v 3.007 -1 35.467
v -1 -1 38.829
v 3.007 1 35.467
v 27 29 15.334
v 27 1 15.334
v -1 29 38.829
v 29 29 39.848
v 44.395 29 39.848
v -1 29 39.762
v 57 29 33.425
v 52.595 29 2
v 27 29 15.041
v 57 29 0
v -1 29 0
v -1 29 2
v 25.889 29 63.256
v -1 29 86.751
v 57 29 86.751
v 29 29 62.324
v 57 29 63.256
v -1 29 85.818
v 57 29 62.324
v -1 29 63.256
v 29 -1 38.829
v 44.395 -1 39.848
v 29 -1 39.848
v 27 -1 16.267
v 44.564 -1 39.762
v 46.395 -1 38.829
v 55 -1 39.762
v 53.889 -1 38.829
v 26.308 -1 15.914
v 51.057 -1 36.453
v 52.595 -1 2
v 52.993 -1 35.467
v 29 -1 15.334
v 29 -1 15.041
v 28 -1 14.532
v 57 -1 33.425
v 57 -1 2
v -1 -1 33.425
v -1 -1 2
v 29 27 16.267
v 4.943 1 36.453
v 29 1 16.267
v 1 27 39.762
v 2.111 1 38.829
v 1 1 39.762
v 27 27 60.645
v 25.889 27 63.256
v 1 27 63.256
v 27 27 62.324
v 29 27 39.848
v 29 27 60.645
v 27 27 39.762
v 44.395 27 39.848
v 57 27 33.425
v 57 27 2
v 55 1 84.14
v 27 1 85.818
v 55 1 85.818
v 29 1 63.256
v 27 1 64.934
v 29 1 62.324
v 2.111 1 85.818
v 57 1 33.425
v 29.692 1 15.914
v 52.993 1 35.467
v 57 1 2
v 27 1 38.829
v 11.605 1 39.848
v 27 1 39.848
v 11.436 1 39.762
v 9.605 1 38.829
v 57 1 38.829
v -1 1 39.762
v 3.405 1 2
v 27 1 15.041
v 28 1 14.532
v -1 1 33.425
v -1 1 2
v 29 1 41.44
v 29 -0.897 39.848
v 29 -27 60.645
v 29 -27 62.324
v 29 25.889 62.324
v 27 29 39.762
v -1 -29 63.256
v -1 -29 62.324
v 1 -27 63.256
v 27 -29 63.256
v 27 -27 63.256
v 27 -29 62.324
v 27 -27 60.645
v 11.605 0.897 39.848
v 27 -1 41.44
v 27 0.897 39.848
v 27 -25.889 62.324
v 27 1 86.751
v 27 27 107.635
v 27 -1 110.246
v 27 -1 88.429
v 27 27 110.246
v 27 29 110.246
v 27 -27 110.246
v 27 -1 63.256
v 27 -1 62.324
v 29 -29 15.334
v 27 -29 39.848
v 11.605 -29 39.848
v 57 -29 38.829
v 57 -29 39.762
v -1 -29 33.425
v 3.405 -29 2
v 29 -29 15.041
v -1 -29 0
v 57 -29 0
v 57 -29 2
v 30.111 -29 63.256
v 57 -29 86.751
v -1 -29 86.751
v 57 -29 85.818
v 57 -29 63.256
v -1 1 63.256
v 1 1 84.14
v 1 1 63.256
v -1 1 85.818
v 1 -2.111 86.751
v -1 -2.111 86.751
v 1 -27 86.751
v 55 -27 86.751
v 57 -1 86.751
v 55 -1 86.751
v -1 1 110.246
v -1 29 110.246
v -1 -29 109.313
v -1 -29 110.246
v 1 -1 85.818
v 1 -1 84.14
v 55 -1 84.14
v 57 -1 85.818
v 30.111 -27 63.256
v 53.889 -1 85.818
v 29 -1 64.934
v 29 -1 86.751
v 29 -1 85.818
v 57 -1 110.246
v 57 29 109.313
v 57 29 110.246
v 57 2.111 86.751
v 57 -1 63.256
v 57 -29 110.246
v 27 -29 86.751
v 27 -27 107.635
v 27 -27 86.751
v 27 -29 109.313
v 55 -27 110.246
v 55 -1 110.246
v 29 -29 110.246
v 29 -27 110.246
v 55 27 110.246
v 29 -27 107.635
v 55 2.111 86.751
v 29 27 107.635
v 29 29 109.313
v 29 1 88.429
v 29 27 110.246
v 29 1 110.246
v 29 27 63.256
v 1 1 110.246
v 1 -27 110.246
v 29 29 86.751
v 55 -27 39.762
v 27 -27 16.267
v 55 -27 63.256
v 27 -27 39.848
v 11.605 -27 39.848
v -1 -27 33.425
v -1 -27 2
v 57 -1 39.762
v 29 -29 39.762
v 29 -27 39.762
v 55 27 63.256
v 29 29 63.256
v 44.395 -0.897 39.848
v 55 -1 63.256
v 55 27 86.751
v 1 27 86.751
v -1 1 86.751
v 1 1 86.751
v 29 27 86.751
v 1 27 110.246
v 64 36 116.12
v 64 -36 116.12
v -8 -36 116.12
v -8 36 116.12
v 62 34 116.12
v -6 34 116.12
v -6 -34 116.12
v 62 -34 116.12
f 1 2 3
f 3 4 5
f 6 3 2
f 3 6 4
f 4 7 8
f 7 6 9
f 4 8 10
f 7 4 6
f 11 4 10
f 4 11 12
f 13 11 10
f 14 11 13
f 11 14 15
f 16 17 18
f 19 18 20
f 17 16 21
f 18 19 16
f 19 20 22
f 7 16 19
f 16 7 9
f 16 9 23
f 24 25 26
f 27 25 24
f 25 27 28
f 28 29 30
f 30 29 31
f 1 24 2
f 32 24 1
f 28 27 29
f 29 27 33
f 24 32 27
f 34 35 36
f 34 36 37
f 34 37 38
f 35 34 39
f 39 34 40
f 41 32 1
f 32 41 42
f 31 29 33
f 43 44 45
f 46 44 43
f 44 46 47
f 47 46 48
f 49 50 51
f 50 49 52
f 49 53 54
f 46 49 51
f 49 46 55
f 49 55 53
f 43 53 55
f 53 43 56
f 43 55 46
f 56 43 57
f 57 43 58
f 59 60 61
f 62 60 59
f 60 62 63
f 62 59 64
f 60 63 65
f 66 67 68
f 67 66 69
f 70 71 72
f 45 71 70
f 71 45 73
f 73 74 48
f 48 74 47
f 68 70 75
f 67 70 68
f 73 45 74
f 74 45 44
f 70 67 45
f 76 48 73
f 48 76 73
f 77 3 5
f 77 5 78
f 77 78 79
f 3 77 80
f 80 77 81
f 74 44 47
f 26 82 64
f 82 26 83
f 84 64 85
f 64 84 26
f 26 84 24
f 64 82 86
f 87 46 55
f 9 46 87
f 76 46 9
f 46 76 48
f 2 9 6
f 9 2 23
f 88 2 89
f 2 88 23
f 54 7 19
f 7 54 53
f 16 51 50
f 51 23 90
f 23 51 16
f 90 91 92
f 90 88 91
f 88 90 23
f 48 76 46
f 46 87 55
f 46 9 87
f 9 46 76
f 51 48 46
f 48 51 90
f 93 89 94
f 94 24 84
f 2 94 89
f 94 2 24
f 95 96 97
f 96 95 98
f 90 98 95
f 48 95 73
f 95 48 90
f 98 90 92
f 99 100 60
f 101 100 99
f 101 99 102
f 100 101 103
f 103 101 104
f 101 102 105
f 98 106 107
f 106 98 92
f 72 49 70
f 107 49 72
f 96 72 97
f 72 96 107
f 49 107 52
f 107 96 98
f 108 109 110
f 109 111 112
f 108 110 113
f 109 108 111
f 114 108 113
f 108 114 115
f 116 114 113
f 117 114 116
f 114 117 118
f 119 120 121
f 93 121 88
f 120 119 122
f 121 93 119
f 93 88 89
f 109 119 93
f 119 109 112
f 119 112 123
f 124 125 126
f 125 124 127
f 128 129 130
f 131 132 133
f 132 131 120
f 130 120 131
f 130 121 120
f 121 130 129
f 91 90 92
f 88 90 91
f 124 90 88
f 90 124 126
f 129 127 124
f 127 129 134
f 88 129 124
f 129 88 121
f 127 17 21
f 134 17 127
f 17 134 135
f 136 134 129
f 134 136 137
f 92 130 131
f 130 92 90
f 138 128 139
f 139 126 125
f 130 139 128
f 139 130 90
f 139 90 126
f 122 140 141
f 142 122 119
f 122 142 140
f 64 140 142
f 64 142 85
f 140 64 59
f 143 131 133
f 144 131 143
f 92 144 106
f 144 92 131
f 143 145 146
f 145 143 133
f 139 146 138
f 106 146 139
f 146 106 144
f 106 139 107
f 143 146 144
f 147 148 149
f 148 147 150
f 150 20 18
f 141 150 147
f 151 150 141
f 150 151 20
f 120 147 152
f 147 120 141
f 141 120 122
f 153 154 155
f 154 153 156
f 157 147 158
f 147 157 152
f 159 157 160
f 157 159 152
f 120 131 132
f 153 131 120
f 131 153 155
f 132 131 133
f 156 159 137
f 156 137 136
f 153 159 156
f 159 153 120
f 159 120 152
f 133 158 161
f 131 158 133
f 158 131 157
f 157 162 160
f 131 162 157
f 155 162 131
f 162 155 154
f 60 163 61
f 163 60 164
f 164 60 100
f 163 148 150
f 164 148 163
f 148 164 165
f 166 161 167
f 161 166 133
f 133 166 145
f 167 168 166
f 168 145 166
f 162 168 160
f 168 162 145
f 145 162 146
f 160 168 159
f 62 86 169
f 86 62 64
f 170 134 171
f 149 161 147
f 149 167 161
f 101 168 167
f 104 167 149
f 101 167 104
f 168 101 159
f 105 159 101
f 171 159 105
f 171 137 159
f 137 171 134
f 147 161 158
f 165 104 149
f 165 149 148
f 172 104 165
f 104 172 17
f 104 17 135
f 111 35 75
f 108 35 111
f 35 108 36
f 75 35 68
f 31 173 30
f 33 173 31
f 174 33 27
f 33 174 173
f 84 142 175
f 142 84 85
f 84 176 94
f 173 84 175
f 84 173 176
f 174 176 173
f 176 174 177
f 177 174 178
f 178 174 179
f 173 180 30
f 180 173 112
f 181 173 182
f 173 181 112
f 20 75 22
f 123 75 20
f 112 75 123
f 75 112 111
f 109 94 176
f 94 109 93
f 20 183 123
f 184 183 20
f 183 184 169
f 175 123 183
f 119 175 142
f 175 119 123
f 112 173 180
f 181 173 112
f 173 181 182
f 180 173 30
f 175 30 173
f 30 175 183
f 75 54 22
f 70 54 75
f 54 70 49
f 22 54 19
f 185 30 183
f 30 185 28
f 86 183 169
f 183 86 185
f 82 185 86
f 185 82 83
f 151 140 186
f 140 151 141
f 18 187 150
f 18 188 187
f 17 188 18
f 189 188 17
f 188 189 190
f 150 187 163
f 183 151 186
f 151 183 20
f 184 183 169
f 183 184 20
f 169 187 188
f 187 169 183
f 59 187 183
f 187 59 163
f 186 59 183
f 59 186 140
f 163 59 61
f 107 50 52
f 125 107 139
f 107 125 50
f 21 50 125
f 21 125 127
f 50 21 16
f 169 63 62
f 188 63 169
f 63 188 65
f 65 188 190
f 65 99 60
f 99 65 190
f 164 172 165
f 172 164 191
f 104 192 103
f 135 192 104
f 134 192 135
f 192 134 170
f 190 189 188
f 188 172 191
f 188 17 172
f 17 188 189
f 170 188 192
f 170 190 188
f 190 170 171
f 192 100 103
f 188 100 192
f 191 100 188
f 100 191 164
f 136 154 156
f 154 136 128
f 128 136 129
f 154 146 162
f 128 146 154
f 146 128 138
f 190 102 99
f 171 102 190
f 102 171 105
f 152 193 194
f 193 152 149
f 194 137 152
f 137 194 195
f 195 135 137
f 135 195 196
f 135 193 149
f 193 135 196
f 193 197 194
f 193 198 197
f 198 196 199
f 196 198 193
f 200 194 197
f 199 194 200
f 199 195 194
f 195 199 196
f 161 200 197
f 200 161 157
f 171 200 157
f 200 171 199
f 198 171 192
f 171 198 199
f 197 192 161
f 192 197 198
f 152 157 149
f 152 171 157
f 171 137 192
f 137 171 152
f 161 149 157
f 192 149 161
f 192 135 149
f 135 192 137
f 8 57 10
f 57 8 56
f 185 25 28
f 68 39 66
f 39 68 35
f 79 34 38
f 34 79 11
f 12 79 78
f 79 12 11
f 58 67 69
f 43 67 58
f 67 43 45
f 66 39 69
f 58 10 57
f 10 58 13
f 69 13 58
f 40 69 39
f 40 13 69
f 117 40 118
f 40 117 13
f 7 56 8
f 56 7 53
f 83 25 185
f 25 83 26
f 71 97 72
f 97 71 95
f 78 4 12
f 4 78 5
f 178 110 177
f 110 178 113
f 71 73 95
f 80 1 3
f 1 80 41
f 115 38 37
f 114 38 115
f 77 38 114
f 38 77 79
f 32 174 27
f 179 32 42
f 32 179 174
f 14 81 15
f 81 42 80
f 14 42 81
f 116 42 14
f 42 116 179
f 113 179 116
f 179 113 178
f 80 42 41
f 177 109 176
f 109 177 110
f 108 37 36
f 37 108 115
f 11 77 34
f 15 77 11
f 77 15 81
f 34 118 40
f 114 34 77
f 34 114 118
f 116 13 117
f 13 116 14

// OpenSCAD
root_2 = sqrt(2);

// the slope of the ramps
slope = 40;	//[15:75]

// the slope of the final ramp
exit_slope = 27;    // [15:75]

// the width of the ramp walls
wall = 2; // [1:5]

// the distance between the outer edge of walls of the ramp
ramp_width = 30; //[10:70]

// the overhang amount on the top funnel
overhang=7;	// [0:10]


// the total width of the entire structure
// wall/2 + ramp_width + ramp_width + wall/2
total_width = wall + ramp_width*2;


// height of each level
level_height = (ramp_width-wall)*tan(slope);

// trim the lower edge of each ramp to fit into the one below
trim=(wall/sin(slope) - wall)*tan(slope);


//echo("level height : ", level_height);
//echo("4 levels high: ", level_height*4);


module ramp(corner=true, angle=slope, cut_top=true){
	translate([-wall/2,-wall/2,0]) 
		union(){
			intersection() {
				translate([0,0,ramp_width*tan(angle) - wall/cos(angle)])
					rotate([0,angle,0])
					 translate([-ramp_width*2,0,0])
						difference(){
							cube([ramp_width*5,ramp_width,ramp_width]);
							translate([-ramp_width,wall,wall]) cube([ramp_width*6,ramp_width-wall*2, ramp_width]);
						}
				if(cut_top==true){
					translate([0,0,-trim]) cube([ramp_width,ramp_width,(ramp_width-wall)*tan(angle)+trim]);
				} else {
					translate([0,0,-trim]) cube([ramp_width,ramp_width,ramp_width*tan(exit_slope)+level_height]);
					// add 
				}
			}
			if (corner== true){
				translate([0,0,level_height])
				 difference(){
					cube([ramp_width,ramp_width,level_height]);
					translate([wall,-wall,-ramp_width])	cube([ramp_width,ramp_width,ramp_width*2]);
				}
			}
		}
}

module exit_ramp(){
	ramp(false,exit_slope, false);
//	translate([-wall/2,-wall/2,0]) cube([ramp_width,wall,level_height]);
//	translate([-wall/2,ramp_width-wall*3/2,0]) cube([ramp_width,wall,level_height]);
}

module funnel() {
	difference() {
		translate([0,0,overhang*tan(slope)])
		difference(){
			pyramid();
			translate([0,0,wall*tan(slope)]) pyramid();
		}
		translate([0,0,-ramp_width]) cube(center=true, [ramp_width*2 - wall,ramp_width*2 -wall,ramp_width*2]);
	}	
}

module pyramid(){
	assign(total_overhang = ramp_width-wall/2+overhang){
	polyhedron(
		points = [ 	[total_overhang,total_overhang,0],	
					[total_overhang,-total_overhang,0],
					[-total_overhang,-total_overhang,0],
					[-total_overhang,total_overhang,0],
					[0,0,-total_overhang*tan(slope)]],
		triangles = [	[0,1,4],
						[1,2,4],
						[2,3,4],
						[3,0,4],
						[0,3,2],
						[0,2,1]],
		convexity=10);
	}
}


module tower(){
	union(){
		ramp();
		translate([ramp_width-wall,wall-ramp_width,(ramp_width-wall)*tan(slope)]) 
			rotate(90)
				ramp();
		translate([(ramp_width-wall)*2,0,(ramp_width-wall)*tan(slope)*2]) 
			rotate(180)
				ramp();
	
		translate([(ramp_width-wall),ramp_width-wall,(ramp_width-wall)*tan(slope)*3]) 	
			rotate(270)
				ramp(false);
	}
}


translate([0,0,wall + (ramp_width-wall)*tan(exit_slope)])
union(){
	tower();
	translate([(ramp_width-wall)*2,0,0]) rotate([0,0,180]) tower();
	translate([ramp_width-wall,0,level_height*4]) funnel();
}
// exit ramps
translate([ramp_width-wall,0,wall]) exit_ramp();
translate([ramp_width-wall,0,wall]) rotate([0,0,180]) exit_ramp();

// base:
translate([-wall/2,-ramp_width+wall/2,0]) cube([ramp_width*2 - wall,ramp_width*2 -wall,wall]);

// bounding box:
